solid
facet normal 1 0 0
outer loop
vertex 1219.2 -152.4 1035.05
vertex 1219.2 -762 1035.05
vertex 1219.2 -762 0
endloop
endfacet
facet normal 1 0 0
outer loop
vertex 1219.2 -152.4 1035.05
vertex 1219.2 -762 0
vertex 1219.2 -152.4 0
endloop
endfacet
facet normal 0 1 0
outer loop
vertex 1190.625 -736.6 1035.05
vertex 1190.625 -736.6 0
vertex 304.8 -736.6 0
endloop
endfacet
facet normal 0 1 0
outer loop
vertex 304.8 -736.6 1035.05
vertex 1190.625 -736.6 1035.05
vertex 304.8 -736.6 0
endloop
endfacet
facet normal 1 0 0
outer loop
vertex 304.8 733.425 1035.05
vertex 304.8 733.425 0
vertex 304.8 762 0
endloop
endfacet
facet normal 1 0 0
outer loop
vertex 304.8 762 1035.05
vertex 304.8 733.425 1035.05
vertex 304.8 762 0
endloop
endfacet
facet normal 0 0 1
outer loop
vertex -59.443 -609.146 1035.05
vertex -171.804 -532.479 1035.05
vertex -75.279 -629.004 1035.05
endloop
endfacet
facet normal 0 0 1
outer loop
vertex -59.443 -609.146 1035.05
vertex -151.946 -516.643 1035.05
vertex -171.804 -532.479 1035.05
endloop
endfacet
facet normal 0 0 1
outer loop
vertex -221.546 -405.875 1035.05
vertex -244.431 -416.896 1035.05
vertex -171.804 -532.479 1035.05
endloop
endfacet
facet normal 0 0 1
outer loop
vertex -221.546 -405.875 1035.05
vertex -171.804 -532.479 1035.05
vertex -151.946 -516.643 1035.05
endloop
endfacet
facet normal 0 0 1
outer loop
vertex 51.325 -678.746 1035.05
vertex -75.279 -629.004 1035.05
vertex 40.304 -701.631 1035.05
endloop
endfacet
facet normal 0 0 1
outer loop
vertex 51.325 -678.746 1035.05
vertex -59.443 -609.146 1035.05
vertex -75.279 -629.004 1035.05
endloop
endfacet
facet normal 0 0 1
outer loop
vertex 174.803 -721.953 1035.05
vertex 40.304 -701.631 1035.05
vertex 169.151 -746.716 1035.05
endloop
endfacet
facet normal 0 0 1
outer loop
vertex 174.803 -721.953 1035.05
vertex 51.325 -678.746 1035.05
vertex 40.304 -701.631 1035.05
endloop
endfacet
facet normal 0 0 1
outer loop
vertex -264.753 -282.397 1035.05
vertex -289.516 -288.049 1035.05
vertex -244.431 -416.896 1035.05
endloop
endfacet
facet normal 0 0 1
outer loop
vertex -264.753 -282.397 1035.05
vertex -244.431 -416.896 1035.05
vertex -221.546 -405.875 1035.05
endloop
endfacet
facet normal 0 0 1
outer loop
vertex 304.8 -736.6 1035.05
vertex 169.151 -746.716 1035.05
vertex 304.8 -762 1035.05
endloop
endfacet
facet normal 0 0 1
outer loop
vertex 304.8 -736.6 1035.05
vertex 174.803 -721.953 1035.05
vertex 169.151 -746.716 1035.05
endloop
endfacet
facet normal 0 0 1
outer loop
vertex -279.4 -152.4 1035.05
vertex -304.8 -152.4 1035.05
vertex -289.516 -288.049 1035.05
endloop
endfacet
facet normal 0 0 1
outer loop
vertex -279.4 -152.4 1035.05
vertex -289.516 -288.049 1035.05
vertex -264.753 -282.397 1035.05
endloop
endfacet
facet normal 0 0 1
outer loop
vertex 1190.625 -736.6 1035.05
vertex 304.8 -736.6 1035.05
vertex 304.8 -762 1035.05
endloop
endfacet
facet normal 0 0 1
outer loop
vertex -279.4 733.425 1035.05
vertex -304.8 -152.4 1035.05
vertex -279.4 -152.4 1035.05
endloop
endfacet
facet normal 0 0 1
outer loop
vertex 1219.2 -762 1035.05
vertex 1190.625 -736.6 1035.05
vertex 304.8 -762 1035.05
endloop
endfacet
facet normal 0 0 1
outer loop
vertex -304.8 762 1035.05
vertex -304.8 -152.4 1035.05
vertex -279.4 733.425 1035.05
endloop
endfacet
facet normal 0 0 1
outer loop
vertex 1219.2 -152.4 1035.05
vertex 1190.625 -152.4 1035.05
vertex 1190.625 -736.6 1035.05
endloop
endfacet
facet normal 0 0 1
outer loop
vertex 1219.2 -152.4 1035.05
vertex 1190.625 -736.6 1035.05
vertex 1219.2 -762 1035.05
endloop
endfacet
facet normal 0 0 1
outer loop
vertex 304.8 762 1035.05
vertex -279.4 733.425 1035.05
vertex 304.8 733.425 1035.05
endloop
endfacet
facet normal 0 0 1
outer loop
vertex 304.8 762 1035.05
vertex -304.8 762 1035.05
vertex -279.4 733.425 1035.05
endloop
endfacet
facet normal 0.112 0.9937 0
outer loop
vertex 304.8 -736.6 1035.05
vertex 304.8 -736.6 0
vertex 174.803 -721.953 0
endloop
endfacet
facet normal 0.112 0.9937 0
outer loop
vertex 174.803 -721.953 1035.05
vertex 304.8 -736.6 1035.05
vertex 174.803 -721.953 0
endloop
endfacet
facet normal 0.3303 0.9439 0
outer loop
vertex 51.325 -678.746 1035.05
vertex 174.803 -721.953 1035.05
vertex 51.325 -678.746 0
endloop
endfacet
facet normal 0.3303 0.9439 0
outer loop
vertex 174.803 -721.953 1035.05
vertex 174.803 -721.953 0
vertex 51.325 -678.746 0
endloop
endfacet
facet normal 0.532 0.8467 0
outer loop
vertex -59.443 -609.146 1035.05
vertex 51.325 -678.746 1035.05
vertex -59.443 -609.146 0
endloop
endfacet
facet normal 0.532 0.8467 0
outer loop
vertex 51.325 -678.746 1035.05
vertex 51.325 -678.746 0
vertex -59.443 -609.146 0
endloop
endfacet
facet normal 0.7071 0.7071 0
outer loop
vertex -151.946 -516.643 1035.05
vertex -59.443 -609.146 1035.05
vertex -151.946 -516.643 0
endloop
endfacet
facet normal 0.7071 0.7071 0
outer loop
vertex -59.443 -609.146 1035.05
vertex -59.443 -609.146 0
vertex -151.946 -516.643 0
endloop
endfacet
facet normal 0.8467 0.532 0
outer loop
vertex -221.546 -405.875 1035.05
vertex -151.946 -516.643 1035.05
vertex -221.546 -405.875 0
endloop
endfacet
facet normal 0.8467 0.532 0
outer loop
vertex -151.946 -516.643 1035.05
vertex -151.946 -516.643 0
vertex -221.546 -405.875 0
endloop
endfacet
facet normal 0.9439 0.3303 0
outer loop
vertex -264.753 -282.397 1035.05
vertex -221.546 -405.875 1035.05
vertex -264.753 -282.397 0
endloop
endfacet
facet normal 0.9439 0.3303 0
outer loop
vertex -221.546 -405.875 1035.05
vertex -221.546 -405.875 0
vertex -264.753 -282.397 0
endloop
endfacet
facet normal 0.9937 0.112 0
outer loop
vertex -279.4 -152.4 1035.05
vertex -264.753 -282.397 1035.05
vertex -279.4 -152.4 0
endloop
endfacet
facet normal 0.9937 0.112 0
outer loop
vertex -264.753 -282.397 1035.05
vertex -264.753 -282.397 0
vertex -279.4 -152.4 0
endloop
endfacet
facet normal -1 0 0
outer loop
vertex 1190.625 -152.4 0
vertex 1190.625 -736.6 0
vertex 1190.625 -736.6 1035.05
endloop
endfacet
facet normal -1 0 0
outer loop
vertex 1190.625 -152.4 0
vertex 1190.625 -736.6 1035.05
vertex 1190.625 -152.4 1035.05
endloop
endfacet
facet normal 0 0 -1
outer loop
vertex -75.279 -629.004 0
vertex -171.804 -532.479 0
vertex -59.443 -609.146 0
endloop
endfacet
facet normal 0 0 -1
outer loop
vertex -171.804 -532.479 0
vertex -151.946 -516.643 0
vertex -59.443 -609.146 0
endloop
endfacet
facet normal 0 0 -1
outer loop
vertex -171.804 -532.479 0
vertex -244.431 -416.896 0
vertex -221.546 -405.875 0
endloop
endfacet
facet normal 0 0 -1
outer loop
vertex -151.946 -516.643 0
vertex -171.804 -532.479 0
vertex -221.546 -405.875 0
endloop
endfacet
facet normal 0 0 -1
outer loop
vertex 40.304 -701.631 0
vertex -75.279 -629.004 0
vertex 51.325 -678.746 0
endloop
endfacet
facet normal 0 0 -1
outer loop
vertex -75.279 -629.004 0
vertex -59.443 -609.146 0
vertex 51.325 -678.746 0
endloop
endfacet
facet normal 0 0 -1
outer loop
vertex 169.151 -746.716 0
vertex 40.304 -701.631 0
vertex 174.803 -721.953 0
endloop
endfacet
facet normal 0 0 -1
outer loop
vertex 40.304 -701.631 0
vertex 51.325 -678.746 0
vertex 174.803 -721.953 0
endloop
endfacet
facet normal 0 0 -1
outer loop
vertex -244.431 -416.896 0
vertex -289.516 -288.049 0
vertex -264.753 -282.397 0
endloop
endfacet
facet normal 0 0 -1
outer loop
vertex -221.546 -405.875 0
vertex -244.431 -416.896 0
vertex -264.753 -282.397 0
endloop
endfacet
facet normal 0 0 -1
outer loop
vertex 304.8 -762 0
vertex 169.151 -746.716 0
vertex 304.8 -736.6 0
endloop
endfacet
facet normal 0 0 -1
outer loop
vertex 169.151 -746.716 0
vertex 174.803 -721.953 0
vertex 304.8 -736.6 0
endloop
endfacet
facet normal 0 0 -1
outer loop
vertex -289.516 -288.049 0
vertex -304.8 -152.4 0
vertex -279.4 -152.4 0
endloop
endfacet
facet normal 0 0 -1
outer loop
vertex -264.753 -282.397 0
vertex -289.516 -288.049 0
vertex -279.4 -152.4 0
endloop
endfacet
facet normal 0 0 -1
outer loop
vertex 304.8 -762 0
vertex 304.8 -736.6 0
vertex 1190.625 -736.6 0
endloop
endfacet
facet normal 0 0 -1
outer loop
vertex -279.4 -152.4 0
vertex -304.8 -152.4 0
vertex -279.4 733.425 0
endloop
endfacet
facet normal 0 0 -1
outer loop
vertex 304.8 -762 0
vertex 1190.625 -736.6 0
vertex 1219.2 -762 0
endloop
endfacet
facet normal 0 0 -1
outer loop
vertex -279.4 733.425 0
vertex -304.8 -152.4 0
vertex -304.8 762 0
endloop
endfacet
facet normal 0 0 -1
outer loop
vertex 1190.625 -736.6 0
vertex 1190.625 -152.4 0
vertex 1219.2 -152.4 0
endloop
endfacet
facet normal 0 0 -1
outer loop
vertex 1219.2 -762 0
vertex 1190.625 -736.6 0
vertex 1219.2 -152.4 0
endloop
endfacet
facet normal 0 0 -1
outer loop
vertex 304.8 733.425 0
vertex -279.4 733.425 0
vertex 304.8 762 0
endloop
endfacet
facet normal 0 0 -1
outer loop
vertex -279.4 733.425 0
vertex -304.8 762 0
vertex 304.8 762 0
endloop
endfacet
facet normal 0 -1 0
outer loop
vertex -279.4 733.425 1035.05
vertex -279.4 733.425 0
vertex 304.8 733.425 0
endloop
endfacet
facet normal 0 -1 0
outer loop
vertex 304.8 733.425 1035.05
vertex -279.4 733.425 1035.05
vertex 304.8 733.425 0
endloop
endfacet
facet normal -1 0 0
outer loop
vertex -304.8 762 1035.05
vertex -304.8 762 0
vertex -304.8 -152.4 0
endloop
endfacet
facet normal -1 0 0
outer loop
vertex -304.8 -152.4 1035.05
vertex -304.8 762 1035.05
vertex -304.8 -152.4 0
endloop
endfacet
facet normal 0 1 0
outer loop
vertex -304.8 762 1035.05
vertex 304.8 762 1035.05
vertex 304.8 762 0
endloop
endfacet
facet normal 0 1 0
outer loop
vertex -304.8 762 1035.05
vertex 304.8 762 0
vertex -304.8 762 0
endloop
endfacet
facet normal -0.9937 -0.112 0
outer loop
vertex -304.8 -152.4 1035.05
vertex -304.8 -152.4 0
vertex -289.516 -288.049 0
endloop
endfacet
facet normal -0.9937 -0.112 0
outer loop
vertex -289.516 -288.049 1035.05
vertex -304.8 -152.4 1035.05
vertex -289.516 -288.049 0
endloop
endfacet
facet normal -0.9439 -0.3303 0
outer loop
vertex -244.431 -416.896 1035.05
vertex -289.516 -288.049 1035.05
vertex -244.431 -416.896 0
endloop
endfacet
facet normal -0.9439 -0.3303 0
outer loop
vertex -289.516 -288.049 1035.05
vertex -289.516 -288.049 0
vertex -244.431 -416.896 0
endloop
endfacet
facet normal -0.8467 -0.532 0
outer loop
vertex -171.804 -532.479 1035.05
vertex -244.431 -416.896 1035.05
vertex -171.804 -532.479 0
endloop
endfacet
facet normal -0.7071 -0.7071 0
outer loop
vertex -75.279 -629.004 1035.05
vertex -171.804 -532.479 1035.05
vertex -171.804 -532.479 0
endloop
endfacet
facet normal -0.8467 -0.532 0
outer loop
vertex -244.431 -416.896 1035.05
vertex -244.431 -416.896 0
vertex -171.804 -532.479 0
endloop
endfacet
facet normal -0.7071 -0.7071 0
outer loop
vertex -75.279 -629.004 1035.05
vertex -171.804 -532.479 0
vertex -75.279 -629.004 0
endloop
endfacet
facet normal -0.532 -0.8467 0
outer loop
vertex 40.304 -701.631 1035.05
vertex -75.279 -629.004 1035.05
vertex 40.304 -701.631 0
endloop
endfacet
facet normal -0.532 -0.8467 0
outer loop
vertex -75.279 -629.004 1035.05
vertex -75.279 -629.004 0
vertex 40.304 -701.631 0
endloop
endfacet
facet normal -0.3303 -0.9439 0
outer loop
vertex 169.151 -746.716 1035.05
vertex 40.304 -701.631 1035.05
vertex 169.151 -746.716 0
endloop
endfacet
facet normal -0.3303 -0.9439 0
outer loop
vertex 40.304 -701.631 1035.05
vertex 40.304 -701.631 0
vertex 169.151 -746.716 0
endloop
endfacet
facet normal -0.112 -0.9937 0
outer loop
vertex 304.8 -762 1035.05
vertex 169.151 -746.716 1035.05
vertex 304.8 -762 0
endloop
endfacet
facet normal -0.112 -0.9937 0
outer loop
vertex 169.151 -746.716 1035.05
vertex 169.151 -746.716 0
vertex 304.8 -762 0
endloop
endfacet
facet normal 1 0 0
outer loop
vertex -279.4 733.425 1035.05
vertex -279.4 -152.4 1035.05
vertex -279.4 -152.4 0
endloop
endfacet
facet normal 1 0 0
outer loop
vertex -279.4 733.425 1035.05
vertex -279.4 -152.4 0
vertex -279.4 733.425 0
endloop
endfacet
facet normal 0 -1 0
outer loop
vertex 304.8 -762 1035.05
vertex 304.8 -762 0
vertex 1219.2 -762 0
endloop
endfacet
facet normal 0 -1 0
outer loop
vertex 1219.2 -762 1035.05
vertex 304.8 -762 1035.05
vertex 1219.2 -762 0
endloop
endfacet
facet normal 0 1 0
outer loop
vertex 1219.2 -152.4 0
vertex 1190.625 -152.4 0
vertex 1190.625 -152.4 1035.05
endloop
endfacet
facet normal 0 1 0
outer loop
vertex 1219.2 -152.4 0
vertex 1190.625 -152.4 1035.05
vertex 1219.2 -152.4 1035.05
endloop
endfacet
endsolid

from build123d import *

# Parameters (mm, degrees)
F0_W     = 584.2
F0_H     = 28.575
F0_W_2   = 28.575
F0_H_2   = 584.2
F1_DEPTH = 1035.05


with BuildPart() as f1:
    # F0 (on Top) → F1 (new body)
    with BuildSketch(Plane.XY):
        with Locations((12.7, 747.7125)):
            Rectangle(F0_W, F0_H)
        Polygon((-279.4, 733.425), (-279.4, 762), (-304.8, 762), (-304.8, -152.4), (-279.4, -152.4), align=None)
        with BuildLine():
            Line((-279.4, -152.4), (-304.8, -152.4))
            ThreePointArc((-304.8, -152.4), (-126.2522938113, -583.4522938113), (304.8, -762))
            Line((304.8, -762), (304.8, -736.6))
            ThreePointArc((304.8, -736.6), (-108.2917815692, -565.4917815692), (-279.4, -152.4))
        make_face()
        Polygon((304.8, -736.6), (304.8, -762), (1219.2, -762), (1219.2, -736.6), (1190.625, -736.6), align=None)
        with Locations((1204.9125, -444.5)):
            Rectangle(F0_W_2, F0_H_2)
    extrude(amount=F1_DEPTH)


solid = f1.part
